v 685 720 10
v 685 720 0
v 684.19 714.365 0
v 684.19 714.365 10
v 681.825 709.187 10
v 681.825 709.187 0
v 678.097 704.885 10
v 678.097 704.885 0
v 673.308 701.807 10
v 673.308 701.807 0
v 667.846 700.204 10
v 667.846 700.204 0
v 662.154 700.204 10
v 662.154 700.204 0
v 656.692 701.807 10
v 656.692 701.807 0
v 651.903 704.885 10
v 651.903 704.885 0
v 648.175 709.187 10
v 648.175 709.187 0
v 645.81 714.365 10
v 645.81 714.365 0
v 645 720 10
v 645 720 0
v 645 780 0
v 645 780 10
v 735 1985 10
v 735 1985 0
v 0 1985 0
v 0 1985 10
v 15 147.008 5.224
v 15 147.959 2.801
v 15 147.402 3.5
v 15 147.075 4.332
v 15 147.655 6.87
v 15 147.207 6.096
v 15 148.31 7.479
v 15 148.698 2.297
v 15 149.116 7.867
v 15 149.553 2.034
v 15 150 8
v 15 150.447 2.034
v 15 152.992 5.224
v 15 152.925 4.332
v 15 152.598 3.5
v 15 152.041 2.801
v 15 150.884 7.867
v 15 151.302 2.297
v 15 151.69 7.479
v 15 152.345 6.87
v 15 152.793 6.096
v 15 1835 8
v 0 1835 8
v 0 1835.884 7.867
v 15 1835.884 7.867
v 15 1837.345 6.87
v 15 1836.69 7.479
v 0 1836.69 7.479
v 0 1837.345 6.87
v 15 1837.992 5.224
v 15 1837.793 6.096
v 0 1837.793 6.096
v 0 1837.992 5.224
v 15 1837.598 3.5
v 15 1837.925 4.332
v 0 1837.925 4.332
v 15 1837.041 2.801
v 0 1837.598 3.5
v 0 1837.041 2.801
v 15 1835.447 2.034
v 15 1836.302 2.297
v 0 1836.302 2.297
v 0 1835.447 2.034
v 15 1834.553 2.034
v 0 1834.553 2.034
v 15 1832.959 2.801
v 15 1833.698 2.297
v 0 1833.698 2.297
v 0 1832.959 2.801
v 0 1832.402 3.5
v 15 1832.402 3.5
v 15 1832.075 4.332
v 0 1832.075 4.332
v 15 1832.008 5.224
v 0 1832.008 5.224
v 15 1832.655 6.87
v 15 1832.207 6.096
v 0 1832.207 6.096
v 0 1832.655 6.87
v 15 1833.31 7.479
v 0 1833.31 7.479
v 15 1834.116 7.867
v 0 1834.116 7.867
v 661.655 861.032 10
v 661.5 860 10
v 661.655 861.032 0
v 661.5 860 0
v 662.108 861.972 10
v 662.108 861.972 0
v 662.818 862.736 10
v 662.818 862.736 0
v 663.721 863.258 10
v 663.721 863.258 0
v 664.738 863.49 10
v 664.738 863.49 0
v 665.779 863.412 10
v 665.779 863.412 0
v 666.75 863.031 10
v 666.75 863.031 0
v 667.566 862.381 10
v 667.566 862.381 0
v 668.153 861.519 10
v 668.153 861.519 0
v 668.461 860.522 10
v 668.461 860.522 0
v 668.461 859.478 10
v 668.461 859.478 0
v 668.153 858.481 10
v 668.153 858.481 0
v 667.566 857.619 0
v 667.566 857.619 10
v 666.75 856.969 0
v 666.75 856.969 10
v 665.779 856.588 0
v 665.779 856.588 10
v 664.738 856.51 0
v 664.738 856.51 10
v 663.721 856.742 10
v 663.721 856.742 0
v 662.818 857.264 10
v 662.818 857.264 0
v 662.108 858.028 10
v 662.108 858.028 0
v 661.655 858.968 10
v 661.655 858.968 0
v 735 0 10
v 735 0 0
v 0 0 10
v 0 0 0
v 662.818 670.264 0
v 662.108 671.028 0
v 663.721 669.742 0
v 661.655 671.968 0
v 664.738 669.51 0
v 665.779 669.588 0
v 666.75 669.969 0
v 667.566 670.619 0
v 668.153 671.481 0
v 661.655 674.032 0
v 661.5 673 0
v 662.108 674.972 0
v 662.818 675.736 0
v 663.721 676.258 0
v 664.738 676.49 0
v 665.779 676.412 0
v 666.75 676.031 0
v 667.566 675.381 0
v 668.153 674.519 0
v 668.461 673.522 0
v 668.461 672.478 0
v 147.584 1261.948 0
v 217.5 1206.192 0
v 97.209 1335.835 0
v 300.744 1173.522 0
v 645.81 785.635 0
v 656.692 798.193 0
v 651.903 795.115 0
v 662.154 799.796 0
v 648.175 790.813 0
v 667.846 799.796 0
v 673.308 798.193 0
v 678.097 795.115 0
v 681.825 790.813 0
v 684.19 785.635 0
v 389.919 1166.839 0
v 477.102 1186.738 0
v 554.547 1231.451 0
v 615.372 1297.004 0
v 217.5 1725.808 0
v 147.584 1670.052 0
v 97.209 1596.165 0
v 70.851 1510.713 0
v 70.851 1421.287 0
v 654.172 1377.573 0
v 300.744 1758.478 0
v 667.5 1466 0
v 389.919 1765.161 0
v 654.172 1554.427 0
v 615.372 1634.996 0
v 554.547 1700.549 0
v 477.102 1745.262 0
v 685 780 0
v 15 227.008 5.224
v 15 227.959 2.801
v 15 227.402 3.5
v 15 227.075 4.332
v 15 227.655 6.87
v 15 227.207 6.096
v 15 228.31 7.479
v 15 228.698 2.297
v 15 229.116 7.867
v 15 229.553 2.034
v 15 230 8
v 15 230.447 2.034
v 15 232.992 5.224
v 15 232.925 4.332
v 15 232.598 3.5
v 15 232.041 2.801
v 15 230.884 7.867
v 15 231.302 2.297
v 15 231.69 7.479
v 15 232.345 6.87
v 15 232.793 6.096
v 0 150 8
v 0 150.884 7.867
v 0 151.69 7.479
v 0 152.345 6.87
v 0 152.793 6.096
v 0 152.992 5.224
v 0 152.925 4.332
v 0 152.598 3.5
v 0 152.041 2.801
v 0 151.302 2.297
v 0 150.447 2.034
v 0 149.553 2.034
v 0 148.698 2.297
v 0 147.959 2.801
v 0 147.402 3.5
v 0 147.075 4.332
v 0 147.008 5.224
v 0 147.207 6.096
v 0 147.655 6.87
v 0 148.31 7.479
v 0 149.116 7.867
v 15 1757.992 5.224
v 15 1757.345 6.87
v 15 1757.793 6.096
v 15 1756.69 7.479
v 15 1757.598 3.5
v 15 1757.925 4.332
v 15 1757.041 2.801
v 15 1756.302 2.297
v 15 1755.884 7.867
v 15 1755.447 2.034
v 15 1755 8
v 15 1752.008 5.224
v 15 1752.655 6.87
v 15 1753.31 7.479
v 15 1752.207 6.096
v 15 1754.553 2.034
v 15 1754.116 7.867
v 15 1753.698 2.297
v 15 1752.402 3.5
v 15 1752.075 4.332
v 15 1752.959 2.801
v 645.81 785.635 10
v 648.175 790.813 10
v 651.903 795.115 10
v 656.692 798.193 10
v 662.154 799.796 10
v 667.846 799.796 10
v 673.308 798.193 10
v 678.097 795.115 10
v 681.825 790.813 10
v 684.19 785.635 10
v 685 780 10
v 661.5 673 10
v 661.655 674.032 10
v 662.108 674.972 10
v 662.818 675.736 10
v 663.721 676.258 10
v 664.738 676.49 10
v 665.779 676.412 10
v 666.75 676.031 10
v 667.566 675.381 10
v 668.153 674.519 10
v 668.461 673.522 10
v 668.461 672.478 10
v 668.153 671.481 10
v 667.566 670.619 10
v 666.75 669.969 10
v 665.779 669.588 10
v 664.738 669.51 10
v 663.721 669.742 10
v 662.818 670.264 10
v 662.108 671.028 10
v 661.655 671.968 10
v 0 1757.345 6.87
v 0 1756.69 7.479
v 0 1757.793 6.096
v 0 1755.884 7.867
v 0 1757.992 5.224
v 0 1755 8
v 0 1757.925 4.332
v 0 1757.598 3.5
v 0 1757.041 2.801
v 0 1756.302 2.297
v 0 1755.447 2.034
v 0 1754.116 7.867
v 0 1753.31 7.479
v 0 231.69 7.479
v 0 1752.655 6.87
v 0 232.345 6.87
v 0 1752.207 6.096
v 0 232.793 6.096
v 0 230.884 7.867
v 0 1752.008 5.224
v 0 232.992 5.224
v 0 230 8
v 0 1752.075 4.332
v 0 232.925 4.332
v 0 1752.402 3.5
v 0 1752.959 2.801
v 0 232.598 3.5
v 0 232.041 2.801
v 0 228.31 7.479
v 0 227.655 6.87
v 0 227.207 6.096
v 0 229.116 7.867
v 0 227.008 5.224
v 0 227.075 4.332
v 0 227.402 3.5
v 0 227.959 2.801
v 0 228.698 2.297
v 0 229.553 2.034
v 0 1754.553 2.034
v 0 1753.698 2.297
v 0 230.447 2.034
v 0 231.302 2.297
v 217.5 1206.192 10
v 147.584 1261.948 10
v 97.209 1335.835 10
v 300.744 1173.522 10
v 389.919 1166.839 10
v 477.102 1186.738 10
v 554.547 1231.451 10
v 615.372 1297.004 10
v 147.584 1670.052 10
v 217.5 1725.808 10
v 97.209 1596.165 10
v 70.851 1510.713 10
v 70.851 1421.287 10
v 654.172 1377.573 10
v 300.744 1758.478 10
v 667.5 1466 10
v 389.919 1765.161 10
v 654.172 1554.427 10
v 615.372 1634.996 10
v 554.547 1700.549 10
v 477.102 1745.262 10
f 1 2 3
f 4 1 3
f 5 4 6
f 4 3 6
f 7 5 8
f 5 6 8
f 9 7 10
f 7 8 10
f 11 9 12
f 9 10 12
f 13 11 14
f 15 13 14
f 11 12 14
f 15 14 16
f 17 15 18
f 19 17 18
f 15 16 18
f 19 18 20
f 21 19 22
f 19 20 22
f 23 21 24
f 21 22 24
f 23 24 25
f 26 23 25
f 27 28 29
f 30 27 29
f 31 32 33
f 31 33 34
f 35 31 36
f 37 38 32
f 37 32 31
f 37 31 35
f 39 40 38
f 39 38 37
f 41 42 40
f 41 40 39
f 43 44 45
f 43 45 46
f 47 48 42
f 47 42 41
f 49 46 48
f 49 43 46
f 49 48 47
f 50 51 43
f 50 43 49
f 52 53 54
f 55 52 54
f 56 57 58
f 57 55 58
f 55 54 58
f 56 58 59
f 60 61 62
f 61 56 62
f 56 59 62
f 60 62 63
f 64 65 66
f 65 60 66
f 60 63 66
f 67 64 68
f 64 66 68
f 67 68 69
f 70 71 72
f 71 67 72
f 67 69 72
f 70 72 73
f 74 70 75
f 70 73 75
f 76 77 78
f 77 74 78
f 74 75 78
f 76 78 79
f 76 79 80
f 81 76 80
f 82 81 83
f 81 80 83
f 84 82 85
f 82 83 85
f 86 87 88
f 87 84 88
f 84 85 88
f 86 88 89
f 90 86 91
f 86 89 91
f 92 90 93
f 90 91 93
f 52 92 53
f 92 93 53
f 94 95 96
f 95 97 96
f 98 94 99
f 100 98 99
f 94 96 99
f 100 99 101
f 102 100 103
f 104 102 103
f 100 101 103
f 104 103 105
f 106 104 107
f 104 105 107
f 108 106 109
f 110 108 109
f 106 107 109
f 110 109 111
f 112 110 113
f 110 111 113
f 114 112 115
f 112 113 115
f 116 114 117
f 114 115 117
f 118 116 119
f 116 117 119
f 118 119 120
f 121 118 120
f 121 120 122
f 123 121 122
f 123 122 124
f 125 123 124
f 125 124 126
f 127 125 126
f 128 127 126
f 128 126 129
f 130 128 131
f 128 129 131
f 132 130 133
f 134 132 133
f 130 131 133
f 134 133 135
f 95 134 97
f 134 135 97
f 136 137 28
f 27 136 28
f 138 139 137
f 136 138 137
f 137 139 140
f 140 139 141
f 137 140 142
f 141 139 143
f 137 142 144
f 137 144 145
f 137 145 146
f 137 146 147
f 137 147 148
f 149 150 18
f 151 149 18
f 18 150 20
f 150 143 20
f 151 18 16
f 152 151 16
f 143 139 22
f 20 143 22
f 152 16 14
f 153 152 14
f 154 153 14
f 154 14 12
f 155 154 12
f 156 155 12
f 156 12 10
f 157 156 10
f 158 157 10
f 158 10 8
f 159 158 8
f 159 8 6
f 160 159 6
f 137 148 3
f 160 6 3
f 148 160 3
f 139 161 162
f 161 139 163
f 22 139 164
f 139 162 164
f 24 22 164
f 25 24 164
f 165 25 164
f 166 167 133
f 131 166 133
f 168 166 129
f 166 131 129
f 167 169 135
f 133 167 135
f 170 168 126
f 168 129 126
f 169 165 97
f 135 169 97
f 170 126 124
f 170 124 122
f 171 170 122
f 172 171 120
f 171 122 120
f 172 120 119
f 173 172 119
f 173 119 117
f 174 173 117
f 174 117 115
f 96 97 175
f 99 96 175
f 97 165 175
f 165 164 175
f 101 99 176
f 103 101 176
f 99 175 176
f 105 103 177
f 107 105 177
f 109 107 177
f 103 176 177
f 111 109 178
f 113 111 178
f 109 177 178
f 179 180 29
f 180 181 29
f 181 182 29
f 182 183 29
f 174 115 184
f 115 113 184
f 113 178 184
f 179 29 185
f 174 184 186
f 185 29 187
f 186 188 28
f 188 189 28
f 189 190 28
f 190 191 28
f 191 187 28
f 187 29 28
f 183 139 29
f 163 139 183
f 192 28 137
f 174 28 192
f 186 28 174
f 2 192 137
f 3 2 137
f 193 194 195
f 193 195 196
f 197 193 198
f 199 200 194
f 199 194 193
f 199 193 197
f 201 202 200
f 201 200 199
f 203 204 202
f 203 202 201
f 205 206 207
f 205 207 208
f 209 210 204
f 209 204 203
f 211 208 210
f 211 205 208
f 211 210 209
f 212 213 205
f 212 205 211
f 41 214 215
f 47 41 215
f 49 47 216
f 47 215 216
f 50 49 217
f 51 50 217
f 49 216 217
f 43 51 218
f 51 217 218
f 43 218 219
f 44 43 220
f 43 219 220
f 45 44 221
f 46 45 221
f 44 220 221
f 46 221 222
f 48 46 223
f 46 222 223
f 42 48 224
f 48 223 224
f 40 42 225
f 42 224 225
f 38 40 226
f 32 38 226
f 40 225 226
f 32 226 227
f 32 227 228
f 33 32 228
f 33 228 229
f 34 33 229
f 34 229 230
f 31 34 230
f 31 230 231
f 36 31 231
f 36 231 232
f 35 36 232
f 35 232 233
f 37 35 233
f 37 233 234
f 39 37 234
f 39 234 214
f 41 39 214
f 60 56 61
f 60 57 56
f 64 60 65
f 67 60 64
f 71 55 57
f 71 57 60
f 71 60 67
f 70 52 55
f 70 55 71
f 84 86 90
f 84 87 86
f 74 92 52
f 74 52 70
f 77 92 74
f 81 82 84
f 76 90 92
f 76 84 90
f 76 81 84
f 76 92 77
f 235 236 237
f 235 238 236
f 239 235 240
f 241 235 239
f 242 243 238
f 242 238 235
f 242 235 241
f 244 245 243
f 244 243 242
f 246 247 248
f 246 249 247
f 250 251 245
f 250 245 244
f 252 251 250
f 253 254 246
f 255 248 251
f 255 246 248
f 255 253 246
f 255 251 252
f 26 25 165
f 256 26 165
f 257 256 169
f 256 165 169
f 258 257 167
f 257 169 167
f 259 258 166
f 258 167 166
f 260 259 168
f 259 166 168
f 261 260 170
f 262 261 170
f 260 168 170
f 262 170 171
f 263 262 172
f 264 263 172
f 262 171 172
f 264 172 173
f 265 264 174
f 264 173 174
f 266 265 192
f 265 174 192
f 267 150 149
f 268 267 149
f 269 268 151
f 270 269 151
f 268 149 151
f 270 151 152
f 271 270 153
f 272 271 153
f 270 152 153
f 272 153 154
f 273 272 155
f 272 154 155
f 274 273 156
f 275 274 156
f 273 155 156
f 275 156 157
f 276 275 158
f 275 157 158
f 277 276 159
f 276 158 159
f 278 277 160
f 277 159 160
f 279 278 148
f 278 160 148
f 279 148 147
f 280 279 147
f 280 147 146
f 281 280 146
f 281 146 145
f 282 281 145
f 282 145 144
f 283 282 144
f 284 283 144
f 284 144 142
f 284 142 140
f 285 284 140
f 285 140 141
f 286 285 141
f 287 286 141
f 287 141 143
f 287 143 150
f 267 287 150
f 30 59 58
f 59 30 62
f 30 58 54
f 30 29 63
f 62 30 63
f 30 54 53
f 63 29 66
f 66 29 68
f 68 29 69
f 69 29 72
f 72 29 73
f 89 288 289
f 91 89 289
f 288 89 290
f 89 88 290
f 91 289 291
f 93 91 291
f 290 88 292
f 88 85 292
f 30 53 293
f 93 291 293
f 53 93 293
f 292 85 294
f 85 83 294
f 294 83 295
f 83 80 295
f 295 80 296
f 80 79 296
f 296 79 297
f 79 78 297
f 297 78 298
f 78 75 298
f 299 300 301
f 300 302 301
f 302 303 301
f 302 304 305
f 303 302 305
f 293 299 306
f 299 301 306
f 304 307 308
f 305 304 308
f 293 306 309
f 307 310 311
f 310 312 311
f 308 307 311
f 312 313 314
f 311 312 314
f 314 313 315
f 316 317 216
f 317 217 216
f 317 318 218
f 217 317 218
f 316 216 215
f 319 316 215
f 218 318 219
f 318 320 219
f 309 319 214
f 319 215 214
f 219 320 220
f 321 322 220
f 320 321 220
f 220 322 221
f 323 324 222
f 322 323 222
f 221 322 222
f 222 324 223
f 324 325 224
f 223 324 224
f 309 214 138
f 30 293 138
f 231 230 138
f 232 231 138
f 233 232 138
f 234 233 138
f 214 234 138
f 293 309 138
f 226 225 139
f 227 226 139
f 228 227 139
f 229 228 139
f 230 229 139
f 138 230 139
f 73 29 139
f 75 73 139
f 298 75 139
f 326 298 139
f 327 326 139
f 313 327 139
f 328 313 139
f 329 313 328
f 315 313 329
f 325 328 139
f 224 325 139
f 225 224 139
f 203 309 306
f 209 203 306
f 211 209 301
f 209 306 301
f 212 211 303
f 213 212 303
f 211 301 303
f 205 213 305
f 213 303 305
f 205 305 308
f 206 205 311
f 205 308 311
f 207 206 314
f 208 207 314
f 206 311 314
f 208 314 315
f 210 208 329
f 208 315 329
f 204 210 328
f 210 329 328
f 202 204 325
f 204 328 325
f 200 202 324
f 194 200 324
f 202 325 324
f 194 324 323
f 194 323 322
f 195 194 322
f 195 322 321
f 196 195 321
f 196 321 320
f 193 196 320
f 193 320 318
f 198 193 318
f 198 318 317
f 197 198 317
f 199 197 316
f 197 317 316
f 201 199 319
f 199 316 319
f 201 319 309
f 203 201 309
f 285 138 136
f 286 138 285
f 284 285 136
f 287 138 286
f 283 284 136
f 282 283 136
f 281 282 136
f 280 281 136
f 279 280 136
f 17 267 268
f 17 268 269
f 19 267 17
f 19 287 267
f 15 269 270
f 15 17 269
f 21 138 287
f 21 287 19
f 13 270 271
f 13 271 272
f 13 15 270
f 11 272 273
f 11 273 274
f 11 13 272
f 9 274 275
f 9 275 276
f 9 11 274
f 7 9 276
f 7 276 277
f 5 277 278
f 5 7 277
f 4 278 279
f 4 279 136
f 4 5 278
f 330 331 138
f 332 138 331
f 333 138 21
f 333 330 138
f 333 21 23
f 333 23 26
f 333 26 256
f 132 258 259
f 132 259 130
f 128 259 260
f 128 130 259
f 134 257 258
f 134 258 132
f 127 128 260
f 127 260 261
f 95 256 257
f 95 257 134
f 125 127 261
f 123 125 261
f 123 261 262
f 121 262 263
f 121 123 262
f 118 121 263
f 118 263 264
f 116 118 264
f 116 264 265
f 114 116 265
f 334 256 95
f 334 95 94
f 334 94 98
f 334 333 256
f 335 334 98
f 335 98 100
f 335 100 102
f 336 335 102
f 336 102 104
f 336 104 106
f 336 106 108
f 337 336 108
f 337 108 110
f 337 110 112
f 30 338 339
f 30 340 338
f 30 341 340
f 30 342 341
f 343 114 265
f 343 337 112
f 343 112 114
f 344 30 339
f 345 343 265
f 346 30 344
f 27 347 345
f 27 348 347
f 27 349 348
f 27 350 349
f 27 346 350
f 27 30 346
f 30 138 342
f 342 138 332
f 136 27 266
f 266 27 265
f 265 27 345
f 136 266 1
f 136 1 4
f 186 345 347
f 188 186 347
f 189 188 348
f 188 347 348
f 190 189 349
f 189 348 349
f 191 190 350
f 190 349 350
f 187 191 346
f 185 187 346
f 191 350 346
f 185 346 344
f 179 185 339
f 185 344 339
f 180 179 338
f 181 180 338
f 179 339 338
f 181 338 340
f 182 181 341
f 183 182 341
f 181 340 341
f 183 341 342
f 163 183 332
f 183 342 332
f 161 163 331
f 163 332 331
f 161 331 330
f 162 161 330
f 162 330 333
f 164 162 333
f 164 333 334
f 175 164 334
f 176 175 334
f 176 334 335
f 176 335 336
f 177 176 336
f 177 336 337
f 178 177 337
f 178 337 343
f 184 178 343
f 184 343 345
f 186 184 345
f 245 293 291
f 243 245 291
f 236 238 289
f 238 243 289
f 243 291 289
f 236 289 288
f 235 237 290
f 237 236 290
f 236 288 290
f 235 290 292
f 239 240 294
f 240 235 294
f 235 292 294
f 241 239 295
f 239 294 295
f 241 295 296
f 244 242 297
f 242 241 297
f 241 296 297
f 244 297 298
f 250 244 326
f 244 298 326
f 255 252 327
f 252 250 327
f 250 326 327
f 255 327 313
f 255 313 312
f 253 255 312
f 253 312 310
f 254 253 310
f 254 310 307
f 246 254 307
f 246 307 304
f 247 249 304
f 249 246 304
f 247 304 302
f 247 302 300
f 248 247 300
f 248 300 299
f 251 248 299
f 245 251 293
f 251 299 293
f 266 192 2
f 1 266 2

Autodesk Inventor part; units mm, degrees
ref_plane "YZ Plane" through (0, 0, 0) normal (1, 0, 0) x (0, 1, 0)
ref_plane "XY Plane" through (0, 0, 0) normal (0, 0, 1) x (1, 0, 0)
sketch "Sketch4" plane through (0, 0, 0) normal (0, 0, 1) x (1, 0, 0)
  line L0 (0, 0) -> (735, 0)
  line L1 (735, 0) -> (735, 1985)
  line L2 (735, 1985) -> (0, 1985)
  line L3 (0, 1985) -> (0, 0)
  dimension "d0" = 735
  dimension "d1" = 1985
extrude "Extrusion1" add sketch "Sketch4" along normal blind 10
sketch "Sketch5" plane through (0, 0, 10) normal (0, 0, 1) x (1, 0, 0)
  circle A0 centre (367.5, 1466) radius 300
  line L0 (735, 1985) -> (0, 1985) projected
  point P0 (0, 0)
  point P1 (367.5, 1985)
  dimension "d4" = 600
  dimension "d5" = 519
extrude "Extrusion2" cut sketch "Sketch5" against normal up to surface (10 mm away)
sketch "Sketch6" plane through (0, 0, 0) normal (0, 0, -1) x (-1, 0, 0)
  line L0 (-665, 720) -> (-665, 780) construction
  line L1 (-645, 720) -> (-645, 780)
  line L2 (-685, 780) -> (-685, 720)
  arc A0 (-685, 720) -> (-645, 720) centre (-665, 720) ccw
  arc A1 (-645, 780) -> (-685, 780) centre (-665, 780) ccw
  line L3 (0, 0) -> (-735, 0) projected
  line L4 (-735, 0) -> (-735, 1985) projected
  circle A2 centre (-665, 860) radius 3.5
  circle A3 centre (-665, 673) radius 3.5
  point P0 (-665, 750)
  point P1 (-665, 700)
  point P2 (-665, 800)
  dimension "d8" = 700
  dimension "d9" = 50
  dimension "d10" = 40
  dimension "d11" = 100
  dimension "d12" = 7
  dimension "d13" = 60
  dimension "d16" = 187
  dimension "d17" = 7
extrude "Extrusion3" cut sketch "Sketch6" against normal blind 10 contours A0 L2 A1 L1 | A2
extrude "Extrusion4" cut sketch "Sketch6" against normal up to surface (10 mm away) contours A3
sketch "Sketch7" plane through (0, 0, 0) normal (-1, 0, 0) x (0, 0, 1)
  circle A0 centre (5, 150) radius 3
  circle A1 centre (5, 230) radius 3
  line L0 (0, 0) -> (10, 0) projected
  point P0 (5, 0)
  dimension "d21" = 150
  dimension "d22" = 80
  dimension "d23" = 6
extrude "Extrusion5" cut sketch "Sketch7" against normal blind 15
thread "Thread1" size "M6x1" class "6H" standard "ISO Metric profile" length 10
thread "Thread2" size "M6x1" class "6H" standard "ISO Metric profile" length 10
ref_plane "Work Plane1" through (0, 992.5, 0) normal (0, 1, 0) x (-1, 0, 0)
mirror "Mirror1" about plane through (0, 992.5, 0) normal (0, 1, 0) of "Extrusion5"
equation "\"d0\" = RahmBrei"
equation "\"d1\" = RahmHoeh"
equation "\"d2\" = RahmDick"
equation "\"RahmBrei\" = 735"
equation "\"RahmHoeh\" = 1985"
equation "\"RahmDick\" = 10"
properties part number "Rahmen"
